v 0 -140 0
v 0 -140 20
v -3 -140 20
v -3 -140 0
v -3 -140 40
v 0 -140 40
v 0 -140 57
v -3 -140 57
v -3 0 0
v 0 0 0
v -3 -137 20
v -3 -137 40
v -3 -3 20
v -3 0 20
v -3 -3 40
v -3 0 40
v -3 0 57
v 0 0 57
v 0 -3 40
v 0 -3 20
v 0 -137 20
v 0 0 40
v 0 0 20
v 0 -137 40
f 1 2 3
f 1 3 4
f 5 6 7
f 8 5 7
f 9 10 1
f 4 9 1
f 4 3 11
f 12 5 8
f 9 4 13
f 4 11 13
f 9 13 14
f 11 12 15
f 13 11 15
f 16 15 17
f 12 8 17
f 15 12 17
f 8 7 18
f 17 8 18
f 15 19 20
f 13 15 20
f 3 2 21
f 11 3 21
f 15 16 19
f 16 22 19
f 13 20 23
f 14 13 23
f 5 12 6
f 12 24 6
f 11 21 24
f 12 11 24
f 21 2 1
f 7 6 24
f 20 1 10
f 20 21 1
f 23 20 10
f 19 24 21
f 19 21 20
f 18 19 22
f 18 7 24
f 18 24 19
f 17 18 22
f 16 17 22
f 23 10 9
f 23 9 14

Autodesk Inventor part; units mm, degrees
ref_plane "YZ Plane" through (0, 0, 0) normal (1, 0, 0) x (0, 1, 0)
ref_plane "XZ Plane" through (0, 0, 0) normal (0, 1, 0) x (-1, 0, 0)
ref_plane "XY Plane" through (0, 0, 0) normal (0, 0, 1) x (1, 0, 0)
sketch "Sketch1" plane through (0, 0, 0) normal (1, 0, 0) x (0, 1, 0)
  line L0 (0, 0) -> (0, 20)
  line L1 (0, 0) -> (-70, 0)
  line L2 (-70, 0) -> (-70, 57)
  line L3 (-70, 57) -> (0, 57)
  line L4 (0, 57) -> (0, 0)
  line L5 (0, 0) -> (-3, 0)
  line L6 (-3, 0) -> (-3, 20)
  line L7 (-3, 20) -> (0, 20)
  line L8 (0, 20) -> (0, 0)
  line L9 (-3, 20) -> (0, 20)
  line L10 (0, 20) -> (0, 40)
  line L11 (0, 40) -> (-3, 40)
  line L12 (-3, 40) -> (-3, 20)
  line L13 (-3, 40) -> (-3, 57)
  line L14 (0, 40) -> (0, 57)
  dimension "d0" = 20
  dimension "d1" = 70
  dimension "d2" = 57
  dimension "d3" = 3
  dimension "d4" = 20
  dimension "d5" = 3
  dimension "d6" = 20
extrude "Extrusion1" add sketch "Sketch1" against normal blind 3 contours L1 L6 L7 L0 | L1 L2 L3 L13 L12 L6 | L11 L13 L3 L4
mirror "Mirror1" about plane through (0, -70, 0) normal (0, -1, 0) of "Extrusion1"
properties part number "dak"
